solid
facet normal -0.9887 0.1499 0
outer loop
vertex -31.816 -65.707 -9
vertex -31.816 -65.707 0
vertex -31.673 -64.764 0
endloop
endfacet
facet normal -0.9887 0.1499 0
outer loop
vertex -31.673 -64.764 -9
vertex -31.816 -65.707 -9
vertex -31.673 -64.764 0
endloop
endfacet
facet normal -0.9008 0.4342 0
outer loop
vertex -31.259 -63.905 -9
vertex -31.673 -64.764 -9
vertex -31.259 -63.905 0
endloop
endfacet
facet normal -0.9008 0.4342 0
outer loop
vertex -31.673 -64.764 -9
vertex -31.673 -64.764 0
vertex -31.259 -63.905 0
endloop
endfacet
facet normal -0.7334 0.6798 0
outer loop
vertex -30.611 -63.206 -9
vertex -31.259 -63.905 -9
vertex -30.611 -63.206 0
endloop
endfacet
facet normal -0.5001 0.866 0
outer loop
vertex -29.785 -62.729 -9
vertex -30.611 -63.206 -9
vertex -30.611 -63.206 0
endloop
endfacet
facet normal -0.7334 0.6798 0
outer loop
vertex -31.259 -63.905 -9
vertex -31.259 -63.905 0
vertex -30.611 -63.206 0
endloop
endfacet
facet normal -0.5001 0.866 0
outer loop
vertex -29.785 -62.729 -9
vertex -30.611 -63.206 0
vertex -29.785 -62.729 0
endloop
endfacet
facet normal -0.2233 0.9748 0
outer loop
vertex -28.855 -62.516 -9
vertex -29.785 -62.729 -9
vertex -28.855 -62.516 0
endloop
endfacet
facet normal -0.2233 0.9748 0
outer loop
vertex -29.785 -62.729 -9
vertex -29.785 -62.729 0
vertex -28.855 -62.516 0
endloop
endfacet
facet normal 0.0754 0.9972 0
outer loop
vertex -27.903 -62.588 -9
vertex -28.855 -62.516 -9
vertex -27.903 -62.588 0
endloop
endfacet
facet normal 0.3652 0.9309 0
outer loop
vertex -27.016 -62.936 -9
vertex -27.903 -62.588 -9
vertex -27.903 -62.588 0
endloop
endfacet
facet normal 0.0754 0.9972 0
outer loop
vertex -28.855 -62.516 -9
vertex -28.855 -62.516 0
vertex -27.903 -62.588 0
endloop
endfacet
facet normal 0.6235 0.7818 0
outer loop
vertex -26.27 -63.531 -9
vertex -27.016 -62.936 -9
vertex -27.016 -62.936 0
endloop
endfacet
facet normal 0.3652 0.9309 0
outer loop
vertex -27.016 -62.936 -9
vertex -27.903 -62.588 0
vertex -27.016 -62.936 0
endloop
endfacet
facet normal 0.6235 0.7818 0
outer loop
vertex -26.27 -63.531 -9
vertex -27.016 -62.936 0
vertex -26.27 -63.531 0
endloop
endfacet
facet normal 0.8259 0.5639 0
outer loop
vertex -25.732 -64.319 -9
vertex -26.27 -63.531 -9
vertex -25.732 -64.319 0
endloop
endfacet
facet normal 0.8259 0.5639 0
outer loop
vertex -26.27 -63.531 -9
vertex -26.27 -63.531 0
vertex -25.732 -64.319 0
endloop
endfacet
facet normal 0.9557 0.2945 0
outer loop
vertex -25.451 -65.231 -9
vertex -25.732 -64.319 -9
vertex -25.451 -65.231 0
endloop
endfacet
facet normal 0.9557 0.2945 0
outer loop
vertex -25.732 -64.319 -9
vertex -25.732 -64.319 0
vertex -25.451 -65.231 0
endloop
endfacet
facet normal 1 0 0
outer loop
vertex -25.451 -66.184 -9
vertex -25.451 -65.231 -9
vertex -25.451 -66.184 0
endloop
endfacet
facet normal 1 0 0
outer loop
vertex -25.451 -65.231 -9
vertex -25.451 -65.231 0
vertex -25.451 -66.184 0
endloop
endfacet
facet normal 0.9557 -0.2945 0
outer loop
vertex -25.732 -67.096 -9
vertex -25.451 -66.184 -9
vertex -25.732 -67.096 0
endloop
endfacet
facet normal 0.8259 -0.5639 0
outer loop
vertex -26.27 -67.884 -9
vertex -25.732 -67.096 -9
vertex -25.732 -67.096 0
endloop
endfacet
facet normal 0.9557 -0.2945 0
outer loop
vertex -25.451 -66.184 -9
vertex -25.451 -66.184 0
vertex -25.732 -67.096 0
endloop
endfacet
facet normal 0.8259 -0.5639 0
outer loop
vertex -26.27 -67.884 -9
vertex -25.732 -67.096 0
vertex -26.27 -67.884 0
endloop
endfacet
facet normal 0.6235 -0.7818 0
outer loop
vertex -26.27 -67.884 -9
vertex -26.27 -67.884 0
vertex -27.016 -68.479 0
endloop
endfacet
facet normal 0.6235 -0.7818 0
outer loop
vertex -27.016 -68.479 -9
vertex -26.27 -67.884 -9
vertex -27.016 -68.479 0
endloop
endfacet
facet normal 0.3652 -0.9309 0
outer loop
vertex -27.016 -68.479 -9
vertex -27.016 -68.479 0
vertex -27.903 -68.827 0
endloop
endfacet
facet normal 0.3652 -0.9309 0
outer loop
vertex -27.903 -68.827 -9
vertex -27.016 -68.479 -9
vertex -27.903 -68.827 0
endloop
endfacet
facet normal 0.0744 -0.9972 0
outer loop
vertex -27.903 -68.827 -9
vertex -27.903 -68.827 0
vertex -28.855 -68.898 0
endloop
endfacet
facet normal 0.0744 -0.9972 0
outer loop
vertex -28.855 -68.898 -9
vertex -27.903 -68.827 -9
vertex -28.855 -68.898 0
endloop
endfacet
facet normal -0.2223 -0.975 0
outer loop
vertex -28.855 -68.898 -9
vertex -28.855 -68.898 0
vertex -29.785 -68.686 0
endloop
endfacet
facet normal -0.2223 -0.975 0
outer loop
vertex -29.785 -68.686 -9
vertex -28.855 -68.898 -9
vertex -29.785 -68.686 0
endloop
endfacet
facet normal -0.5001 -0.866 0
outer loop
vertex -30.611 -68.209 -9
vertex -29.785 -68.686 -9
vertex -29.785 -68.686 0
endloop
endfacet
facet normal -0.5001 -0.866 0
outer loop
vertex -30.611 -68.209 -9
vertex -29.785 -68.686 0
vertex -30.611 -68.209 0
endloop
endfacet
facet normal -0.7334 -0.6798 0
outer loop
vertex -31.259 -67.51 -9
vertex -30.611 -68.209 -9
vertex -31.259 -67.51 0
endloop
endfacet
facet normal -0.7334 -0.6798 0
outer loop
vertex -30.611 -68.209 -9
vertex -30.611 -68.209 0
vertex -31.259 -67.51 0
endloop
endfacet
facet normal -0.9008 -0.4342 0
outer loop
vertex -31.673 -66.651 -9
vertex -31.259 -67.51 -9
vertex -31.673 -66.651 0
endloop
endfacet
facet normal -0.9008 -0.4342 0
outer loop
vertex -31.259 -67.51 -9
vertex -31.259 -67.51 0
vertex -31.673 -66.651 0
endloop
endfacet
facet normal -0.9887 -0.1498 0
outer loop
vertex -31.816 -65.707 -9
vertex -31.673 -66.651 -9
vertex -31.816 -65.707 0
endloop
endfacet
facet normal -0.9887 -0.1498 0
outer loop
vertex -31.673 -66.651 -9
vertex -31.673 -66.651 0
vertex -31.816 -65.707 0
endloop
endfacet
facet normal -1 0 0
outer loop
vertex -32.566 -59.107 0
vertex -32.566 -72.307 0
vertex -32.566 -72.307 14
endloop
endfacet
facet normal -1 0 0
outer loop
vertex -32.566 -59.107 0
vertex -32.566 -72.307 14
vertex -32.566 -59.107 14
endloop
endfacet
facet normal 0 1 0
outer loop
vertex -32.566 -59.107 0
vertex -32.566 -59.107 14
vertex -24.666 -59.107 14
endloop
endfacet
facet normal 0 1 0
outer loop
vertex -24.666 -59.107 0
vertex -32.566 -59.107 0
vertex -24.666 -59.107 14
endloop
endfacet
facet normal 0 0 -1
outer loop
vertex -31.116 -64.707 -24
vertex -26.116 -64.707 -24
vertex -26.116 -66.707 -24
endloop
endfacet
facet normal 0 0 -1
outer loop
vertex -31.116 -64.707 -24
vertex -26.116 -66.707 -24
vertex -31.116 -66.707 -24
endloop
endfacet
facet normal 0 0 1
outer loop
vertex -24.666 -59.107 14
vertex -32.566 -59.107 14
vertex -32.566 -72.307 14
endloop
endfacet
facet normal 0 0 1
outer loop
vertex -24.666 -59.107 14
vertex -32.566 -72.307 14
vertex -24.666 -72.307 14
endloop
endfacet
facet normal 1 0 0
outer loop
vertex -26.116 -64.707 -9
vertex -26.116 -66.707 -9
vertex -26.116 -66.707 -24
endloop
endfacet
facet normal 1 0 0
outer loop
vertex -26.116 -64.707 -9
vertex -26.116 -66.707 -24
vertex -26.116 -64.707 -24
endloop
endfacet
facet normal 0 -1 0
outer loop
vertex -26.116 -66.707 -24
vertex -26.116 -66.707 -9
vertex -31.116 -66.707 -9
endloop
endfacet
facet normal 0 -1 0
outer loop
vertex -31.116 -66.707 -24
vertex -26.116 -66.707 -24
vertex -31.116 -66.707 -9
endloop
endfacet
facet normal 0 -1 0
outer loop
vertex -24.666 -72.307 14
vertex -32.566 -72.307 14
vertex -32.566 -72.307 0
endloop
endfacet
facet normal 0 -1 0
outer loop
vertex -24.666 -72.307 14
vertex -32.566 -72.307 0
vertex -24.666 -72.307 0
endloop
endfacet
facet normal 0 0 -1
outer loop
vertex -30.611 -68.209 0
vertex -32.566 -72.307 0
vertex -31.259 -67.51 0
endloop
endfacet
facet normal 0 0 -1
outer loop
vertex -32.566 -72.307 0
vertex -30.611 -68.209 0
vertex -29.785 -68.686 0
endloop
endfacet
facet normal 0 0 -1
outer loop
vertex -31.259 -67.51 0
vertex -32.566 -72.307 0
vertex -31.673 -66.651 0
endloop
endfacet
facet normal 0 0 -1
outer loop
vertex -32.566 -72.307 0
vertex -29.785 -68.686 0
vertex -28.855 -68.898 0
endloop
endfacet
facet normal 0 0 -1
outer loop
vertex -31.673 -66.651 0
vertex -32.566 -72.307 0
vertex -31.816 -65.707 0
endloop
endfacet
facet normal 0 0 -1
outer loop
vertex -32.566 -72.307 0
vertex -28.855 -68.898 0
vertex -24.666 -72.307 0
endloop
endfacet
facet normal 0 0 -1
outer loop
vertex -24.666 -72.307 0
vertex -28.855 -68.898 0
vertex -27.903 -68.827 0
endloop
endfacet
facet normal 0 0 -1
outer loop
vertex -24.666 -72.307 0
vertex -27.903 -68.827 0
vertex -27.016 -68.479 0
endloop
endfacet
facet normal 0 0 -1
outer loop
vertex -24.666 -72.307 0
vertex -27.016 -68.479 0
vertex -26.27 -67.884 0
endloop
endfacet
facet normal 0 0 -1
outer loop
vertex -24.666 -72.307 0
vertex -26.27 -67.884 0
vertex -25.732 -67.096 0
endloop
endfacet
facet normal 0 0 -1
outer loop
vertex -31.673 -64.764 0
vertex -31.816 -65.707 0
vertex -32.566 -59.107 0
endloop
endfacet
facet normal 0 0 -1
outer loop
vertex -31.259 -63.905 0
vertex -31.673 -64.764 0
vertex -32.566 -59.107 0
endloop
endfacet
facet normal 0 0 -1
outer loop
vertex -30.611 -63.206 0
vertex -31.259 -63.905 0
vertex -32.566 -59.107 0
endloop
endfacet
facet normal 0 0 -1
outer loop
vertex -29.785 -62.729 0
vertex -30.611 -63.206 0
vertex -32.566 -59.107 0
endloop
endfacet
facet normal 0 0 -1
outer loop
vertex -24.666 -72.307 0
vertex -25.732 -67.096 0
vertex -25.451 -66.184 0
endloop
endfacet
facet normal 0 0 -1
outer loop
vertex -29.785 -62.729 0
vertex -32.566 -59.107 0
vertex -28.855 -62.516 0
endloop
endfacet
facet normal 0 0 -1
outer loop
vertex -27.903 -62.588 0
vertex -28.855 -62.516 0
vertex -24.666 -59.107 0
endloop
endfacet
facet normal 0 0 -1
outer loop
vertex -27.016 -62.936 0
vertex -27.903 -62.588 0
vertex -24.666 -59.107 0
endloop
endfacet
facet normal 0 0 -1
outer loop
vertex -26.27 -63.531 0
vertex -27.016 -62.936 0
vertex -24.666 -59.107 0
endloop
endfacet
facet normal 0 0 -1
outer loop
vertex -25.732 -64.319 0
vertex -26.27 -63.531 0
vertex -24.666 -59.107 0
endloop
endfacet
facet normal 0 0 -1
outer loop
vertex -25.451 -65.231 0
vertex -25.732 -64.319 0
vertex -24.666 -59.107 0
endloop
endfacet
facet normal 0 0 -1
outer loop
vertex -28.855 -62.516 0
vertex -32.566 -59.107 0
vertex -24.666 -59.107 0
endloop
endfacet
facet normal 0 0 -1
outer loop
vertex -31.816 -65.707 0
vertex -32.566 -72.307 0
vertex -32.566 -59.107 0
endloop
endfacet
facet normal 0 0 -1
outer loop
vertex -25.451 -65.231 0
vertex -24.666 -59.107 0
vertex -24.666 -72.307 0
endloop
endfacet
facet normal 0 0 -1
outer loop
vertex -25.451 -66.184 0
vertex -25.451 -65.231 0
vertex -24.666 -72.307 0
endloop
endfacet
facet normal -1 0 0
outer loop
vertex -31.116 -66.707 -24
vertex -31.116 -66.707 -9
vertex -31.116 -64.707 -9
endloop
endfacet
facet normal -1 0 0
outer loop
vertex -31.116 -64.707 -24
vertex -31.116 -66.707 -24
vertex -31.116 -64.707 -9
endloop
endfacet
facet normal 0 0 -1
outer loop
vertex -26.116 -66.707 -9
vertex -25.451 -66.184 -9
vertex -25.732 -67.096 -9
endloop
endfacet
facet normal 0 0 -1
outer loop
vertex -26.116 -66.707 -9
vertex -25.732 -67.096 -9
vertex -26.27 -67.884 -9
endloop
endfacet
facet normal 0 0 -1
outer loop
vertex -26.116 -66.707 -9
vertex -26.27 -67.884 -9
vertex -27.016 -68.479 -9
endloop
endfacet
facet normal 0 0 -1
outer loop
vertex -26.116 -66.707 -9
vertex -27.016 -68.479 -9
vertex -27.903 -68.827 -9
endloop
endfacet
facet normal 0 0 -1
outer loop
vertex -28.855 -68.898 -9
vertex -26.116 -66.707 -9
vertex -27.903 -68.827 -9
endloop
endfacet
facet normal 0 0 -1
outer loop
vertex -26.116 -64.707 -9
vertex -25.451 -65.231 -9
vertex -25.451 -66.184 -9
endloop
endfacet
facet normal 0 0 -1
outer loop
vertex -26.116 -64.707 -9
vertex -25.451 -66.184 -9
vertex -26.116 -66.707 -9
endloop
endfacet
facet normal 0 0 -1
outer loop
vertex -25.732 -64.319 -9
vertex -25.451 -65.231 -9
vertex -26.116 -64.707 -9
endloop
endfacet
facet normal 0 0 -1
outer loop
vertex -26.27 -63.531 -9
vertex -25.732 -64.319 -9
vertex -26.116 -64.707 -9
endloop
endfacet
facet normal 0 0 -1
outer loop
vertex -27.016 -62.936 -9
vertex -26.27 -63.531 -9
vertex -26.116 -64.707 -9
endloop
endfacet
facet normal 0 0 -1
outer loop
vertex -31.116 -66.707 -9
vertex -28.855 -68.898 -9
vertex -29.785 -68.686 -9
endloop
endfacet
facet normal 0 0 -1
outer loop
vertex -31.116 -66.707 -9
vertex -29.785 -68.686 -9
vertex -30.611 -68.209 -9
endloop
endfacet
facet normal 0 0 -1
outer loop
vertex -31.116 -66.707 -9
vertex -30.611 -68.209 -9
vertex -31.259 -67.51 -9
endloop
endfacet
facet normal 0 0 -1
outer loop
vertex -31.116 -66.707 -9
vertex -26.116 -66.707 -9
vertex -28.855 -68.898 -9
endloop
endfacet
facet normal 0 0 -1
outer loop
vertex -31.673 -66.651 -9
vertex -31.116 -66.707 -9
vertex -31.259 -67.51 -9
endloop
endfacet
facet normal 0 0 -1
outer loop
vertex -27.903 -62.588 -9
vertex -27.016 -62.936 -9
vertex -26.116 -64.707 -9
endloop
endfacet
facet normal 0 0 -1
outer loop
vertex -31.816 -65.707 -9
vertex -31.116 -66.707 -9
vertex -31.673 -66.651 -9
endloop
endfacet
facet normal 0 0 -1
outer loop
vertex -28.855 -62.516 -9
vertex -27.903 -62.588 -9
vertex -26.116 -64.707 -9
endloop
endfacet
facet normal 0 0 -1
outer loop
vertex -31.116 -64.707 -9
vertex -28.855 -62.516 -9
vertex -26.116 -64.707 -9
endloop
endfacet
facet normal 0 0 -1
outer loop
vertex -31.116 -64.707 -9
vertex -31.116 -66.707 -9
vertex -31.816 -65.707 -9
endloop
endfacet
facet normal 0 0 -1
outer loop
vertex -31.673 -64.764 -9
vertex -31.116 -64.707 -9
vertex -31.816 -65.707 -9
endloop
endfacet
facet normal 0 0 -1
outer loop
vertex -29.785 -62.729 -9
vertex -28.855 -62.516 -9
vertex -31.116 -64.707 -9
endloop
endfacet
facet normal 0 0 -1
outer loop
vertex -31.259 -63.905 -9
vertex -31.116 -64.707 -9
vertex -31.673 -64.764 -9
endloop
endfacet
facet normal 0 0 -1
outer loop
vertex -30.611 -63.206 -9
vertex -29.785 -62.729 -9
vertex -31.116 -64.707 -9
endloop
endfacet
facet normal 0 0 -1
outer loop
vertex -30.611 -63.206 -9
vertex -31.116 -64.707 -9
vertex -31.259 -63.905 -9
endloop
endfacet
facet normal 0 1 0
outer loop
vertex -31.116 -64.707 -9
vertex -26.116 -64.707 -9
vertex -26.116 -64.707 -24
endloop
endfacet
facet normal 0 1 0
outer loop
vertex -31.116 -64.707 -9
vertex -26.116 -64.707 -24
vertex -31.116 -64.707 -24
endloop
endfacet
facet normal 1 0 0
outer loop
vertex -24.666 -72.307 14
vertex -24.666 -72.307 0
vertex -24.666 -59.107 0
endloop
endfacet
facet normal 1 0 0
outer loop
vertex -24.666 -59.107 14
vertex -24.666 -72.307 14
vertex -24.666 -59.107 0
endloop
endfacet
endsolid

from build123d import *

# Parameters (mm, degrees)
SKETCH_1_W      = 7.9
SKETCH_1_H      = 13.2
EXTRUDE_1_DEPTH = 14
SKETCH_2_R      = 3.2
EXTRUDE_2_DEPTH = 9
SKETCH_3_W      = 5
SKETCH_3_H      = 2
EXTRUDE_3_DEPTH = 15


with BuildPart() as part:
    # 草圖1 → 填料-伸長1 (new body)
    with BuildSketch(Plane.XY):
        with Locations((-28.615519845, -65.707444045)):
            Rectangle(SKETCH_1_W, SKETCH_1_H)
    extrude(amount=EXTRUDE_1_DEPTH)

    # 草圖2 → 填料-伸長2 (add)
    with BuildSketch(Plane(origin=(0, 0, 0), x_dir=(-1, 0, 0), z_dir=(0, 0, -1))):
        with Locations((28.615519845, -65.707444045)):
            Circle(SKETCH_2_R)
    extrude(amount=EXTRUDE_2_DEPTH)

    # 草圖3 → 填料-伸長3 (add)
    with BuildSketch(Plane(origin=(0, 0, -9), x_dir=(-1, 0, 0), z_dir=(0, 0, -1))):
        with Locations((28.615519845, -65.707444045)):
            Rectangle(SKETCH_3_W, SKETCH_3_H)
    extrude(amount=EXTRUDE_3_DEPTH)


solid = part.part
